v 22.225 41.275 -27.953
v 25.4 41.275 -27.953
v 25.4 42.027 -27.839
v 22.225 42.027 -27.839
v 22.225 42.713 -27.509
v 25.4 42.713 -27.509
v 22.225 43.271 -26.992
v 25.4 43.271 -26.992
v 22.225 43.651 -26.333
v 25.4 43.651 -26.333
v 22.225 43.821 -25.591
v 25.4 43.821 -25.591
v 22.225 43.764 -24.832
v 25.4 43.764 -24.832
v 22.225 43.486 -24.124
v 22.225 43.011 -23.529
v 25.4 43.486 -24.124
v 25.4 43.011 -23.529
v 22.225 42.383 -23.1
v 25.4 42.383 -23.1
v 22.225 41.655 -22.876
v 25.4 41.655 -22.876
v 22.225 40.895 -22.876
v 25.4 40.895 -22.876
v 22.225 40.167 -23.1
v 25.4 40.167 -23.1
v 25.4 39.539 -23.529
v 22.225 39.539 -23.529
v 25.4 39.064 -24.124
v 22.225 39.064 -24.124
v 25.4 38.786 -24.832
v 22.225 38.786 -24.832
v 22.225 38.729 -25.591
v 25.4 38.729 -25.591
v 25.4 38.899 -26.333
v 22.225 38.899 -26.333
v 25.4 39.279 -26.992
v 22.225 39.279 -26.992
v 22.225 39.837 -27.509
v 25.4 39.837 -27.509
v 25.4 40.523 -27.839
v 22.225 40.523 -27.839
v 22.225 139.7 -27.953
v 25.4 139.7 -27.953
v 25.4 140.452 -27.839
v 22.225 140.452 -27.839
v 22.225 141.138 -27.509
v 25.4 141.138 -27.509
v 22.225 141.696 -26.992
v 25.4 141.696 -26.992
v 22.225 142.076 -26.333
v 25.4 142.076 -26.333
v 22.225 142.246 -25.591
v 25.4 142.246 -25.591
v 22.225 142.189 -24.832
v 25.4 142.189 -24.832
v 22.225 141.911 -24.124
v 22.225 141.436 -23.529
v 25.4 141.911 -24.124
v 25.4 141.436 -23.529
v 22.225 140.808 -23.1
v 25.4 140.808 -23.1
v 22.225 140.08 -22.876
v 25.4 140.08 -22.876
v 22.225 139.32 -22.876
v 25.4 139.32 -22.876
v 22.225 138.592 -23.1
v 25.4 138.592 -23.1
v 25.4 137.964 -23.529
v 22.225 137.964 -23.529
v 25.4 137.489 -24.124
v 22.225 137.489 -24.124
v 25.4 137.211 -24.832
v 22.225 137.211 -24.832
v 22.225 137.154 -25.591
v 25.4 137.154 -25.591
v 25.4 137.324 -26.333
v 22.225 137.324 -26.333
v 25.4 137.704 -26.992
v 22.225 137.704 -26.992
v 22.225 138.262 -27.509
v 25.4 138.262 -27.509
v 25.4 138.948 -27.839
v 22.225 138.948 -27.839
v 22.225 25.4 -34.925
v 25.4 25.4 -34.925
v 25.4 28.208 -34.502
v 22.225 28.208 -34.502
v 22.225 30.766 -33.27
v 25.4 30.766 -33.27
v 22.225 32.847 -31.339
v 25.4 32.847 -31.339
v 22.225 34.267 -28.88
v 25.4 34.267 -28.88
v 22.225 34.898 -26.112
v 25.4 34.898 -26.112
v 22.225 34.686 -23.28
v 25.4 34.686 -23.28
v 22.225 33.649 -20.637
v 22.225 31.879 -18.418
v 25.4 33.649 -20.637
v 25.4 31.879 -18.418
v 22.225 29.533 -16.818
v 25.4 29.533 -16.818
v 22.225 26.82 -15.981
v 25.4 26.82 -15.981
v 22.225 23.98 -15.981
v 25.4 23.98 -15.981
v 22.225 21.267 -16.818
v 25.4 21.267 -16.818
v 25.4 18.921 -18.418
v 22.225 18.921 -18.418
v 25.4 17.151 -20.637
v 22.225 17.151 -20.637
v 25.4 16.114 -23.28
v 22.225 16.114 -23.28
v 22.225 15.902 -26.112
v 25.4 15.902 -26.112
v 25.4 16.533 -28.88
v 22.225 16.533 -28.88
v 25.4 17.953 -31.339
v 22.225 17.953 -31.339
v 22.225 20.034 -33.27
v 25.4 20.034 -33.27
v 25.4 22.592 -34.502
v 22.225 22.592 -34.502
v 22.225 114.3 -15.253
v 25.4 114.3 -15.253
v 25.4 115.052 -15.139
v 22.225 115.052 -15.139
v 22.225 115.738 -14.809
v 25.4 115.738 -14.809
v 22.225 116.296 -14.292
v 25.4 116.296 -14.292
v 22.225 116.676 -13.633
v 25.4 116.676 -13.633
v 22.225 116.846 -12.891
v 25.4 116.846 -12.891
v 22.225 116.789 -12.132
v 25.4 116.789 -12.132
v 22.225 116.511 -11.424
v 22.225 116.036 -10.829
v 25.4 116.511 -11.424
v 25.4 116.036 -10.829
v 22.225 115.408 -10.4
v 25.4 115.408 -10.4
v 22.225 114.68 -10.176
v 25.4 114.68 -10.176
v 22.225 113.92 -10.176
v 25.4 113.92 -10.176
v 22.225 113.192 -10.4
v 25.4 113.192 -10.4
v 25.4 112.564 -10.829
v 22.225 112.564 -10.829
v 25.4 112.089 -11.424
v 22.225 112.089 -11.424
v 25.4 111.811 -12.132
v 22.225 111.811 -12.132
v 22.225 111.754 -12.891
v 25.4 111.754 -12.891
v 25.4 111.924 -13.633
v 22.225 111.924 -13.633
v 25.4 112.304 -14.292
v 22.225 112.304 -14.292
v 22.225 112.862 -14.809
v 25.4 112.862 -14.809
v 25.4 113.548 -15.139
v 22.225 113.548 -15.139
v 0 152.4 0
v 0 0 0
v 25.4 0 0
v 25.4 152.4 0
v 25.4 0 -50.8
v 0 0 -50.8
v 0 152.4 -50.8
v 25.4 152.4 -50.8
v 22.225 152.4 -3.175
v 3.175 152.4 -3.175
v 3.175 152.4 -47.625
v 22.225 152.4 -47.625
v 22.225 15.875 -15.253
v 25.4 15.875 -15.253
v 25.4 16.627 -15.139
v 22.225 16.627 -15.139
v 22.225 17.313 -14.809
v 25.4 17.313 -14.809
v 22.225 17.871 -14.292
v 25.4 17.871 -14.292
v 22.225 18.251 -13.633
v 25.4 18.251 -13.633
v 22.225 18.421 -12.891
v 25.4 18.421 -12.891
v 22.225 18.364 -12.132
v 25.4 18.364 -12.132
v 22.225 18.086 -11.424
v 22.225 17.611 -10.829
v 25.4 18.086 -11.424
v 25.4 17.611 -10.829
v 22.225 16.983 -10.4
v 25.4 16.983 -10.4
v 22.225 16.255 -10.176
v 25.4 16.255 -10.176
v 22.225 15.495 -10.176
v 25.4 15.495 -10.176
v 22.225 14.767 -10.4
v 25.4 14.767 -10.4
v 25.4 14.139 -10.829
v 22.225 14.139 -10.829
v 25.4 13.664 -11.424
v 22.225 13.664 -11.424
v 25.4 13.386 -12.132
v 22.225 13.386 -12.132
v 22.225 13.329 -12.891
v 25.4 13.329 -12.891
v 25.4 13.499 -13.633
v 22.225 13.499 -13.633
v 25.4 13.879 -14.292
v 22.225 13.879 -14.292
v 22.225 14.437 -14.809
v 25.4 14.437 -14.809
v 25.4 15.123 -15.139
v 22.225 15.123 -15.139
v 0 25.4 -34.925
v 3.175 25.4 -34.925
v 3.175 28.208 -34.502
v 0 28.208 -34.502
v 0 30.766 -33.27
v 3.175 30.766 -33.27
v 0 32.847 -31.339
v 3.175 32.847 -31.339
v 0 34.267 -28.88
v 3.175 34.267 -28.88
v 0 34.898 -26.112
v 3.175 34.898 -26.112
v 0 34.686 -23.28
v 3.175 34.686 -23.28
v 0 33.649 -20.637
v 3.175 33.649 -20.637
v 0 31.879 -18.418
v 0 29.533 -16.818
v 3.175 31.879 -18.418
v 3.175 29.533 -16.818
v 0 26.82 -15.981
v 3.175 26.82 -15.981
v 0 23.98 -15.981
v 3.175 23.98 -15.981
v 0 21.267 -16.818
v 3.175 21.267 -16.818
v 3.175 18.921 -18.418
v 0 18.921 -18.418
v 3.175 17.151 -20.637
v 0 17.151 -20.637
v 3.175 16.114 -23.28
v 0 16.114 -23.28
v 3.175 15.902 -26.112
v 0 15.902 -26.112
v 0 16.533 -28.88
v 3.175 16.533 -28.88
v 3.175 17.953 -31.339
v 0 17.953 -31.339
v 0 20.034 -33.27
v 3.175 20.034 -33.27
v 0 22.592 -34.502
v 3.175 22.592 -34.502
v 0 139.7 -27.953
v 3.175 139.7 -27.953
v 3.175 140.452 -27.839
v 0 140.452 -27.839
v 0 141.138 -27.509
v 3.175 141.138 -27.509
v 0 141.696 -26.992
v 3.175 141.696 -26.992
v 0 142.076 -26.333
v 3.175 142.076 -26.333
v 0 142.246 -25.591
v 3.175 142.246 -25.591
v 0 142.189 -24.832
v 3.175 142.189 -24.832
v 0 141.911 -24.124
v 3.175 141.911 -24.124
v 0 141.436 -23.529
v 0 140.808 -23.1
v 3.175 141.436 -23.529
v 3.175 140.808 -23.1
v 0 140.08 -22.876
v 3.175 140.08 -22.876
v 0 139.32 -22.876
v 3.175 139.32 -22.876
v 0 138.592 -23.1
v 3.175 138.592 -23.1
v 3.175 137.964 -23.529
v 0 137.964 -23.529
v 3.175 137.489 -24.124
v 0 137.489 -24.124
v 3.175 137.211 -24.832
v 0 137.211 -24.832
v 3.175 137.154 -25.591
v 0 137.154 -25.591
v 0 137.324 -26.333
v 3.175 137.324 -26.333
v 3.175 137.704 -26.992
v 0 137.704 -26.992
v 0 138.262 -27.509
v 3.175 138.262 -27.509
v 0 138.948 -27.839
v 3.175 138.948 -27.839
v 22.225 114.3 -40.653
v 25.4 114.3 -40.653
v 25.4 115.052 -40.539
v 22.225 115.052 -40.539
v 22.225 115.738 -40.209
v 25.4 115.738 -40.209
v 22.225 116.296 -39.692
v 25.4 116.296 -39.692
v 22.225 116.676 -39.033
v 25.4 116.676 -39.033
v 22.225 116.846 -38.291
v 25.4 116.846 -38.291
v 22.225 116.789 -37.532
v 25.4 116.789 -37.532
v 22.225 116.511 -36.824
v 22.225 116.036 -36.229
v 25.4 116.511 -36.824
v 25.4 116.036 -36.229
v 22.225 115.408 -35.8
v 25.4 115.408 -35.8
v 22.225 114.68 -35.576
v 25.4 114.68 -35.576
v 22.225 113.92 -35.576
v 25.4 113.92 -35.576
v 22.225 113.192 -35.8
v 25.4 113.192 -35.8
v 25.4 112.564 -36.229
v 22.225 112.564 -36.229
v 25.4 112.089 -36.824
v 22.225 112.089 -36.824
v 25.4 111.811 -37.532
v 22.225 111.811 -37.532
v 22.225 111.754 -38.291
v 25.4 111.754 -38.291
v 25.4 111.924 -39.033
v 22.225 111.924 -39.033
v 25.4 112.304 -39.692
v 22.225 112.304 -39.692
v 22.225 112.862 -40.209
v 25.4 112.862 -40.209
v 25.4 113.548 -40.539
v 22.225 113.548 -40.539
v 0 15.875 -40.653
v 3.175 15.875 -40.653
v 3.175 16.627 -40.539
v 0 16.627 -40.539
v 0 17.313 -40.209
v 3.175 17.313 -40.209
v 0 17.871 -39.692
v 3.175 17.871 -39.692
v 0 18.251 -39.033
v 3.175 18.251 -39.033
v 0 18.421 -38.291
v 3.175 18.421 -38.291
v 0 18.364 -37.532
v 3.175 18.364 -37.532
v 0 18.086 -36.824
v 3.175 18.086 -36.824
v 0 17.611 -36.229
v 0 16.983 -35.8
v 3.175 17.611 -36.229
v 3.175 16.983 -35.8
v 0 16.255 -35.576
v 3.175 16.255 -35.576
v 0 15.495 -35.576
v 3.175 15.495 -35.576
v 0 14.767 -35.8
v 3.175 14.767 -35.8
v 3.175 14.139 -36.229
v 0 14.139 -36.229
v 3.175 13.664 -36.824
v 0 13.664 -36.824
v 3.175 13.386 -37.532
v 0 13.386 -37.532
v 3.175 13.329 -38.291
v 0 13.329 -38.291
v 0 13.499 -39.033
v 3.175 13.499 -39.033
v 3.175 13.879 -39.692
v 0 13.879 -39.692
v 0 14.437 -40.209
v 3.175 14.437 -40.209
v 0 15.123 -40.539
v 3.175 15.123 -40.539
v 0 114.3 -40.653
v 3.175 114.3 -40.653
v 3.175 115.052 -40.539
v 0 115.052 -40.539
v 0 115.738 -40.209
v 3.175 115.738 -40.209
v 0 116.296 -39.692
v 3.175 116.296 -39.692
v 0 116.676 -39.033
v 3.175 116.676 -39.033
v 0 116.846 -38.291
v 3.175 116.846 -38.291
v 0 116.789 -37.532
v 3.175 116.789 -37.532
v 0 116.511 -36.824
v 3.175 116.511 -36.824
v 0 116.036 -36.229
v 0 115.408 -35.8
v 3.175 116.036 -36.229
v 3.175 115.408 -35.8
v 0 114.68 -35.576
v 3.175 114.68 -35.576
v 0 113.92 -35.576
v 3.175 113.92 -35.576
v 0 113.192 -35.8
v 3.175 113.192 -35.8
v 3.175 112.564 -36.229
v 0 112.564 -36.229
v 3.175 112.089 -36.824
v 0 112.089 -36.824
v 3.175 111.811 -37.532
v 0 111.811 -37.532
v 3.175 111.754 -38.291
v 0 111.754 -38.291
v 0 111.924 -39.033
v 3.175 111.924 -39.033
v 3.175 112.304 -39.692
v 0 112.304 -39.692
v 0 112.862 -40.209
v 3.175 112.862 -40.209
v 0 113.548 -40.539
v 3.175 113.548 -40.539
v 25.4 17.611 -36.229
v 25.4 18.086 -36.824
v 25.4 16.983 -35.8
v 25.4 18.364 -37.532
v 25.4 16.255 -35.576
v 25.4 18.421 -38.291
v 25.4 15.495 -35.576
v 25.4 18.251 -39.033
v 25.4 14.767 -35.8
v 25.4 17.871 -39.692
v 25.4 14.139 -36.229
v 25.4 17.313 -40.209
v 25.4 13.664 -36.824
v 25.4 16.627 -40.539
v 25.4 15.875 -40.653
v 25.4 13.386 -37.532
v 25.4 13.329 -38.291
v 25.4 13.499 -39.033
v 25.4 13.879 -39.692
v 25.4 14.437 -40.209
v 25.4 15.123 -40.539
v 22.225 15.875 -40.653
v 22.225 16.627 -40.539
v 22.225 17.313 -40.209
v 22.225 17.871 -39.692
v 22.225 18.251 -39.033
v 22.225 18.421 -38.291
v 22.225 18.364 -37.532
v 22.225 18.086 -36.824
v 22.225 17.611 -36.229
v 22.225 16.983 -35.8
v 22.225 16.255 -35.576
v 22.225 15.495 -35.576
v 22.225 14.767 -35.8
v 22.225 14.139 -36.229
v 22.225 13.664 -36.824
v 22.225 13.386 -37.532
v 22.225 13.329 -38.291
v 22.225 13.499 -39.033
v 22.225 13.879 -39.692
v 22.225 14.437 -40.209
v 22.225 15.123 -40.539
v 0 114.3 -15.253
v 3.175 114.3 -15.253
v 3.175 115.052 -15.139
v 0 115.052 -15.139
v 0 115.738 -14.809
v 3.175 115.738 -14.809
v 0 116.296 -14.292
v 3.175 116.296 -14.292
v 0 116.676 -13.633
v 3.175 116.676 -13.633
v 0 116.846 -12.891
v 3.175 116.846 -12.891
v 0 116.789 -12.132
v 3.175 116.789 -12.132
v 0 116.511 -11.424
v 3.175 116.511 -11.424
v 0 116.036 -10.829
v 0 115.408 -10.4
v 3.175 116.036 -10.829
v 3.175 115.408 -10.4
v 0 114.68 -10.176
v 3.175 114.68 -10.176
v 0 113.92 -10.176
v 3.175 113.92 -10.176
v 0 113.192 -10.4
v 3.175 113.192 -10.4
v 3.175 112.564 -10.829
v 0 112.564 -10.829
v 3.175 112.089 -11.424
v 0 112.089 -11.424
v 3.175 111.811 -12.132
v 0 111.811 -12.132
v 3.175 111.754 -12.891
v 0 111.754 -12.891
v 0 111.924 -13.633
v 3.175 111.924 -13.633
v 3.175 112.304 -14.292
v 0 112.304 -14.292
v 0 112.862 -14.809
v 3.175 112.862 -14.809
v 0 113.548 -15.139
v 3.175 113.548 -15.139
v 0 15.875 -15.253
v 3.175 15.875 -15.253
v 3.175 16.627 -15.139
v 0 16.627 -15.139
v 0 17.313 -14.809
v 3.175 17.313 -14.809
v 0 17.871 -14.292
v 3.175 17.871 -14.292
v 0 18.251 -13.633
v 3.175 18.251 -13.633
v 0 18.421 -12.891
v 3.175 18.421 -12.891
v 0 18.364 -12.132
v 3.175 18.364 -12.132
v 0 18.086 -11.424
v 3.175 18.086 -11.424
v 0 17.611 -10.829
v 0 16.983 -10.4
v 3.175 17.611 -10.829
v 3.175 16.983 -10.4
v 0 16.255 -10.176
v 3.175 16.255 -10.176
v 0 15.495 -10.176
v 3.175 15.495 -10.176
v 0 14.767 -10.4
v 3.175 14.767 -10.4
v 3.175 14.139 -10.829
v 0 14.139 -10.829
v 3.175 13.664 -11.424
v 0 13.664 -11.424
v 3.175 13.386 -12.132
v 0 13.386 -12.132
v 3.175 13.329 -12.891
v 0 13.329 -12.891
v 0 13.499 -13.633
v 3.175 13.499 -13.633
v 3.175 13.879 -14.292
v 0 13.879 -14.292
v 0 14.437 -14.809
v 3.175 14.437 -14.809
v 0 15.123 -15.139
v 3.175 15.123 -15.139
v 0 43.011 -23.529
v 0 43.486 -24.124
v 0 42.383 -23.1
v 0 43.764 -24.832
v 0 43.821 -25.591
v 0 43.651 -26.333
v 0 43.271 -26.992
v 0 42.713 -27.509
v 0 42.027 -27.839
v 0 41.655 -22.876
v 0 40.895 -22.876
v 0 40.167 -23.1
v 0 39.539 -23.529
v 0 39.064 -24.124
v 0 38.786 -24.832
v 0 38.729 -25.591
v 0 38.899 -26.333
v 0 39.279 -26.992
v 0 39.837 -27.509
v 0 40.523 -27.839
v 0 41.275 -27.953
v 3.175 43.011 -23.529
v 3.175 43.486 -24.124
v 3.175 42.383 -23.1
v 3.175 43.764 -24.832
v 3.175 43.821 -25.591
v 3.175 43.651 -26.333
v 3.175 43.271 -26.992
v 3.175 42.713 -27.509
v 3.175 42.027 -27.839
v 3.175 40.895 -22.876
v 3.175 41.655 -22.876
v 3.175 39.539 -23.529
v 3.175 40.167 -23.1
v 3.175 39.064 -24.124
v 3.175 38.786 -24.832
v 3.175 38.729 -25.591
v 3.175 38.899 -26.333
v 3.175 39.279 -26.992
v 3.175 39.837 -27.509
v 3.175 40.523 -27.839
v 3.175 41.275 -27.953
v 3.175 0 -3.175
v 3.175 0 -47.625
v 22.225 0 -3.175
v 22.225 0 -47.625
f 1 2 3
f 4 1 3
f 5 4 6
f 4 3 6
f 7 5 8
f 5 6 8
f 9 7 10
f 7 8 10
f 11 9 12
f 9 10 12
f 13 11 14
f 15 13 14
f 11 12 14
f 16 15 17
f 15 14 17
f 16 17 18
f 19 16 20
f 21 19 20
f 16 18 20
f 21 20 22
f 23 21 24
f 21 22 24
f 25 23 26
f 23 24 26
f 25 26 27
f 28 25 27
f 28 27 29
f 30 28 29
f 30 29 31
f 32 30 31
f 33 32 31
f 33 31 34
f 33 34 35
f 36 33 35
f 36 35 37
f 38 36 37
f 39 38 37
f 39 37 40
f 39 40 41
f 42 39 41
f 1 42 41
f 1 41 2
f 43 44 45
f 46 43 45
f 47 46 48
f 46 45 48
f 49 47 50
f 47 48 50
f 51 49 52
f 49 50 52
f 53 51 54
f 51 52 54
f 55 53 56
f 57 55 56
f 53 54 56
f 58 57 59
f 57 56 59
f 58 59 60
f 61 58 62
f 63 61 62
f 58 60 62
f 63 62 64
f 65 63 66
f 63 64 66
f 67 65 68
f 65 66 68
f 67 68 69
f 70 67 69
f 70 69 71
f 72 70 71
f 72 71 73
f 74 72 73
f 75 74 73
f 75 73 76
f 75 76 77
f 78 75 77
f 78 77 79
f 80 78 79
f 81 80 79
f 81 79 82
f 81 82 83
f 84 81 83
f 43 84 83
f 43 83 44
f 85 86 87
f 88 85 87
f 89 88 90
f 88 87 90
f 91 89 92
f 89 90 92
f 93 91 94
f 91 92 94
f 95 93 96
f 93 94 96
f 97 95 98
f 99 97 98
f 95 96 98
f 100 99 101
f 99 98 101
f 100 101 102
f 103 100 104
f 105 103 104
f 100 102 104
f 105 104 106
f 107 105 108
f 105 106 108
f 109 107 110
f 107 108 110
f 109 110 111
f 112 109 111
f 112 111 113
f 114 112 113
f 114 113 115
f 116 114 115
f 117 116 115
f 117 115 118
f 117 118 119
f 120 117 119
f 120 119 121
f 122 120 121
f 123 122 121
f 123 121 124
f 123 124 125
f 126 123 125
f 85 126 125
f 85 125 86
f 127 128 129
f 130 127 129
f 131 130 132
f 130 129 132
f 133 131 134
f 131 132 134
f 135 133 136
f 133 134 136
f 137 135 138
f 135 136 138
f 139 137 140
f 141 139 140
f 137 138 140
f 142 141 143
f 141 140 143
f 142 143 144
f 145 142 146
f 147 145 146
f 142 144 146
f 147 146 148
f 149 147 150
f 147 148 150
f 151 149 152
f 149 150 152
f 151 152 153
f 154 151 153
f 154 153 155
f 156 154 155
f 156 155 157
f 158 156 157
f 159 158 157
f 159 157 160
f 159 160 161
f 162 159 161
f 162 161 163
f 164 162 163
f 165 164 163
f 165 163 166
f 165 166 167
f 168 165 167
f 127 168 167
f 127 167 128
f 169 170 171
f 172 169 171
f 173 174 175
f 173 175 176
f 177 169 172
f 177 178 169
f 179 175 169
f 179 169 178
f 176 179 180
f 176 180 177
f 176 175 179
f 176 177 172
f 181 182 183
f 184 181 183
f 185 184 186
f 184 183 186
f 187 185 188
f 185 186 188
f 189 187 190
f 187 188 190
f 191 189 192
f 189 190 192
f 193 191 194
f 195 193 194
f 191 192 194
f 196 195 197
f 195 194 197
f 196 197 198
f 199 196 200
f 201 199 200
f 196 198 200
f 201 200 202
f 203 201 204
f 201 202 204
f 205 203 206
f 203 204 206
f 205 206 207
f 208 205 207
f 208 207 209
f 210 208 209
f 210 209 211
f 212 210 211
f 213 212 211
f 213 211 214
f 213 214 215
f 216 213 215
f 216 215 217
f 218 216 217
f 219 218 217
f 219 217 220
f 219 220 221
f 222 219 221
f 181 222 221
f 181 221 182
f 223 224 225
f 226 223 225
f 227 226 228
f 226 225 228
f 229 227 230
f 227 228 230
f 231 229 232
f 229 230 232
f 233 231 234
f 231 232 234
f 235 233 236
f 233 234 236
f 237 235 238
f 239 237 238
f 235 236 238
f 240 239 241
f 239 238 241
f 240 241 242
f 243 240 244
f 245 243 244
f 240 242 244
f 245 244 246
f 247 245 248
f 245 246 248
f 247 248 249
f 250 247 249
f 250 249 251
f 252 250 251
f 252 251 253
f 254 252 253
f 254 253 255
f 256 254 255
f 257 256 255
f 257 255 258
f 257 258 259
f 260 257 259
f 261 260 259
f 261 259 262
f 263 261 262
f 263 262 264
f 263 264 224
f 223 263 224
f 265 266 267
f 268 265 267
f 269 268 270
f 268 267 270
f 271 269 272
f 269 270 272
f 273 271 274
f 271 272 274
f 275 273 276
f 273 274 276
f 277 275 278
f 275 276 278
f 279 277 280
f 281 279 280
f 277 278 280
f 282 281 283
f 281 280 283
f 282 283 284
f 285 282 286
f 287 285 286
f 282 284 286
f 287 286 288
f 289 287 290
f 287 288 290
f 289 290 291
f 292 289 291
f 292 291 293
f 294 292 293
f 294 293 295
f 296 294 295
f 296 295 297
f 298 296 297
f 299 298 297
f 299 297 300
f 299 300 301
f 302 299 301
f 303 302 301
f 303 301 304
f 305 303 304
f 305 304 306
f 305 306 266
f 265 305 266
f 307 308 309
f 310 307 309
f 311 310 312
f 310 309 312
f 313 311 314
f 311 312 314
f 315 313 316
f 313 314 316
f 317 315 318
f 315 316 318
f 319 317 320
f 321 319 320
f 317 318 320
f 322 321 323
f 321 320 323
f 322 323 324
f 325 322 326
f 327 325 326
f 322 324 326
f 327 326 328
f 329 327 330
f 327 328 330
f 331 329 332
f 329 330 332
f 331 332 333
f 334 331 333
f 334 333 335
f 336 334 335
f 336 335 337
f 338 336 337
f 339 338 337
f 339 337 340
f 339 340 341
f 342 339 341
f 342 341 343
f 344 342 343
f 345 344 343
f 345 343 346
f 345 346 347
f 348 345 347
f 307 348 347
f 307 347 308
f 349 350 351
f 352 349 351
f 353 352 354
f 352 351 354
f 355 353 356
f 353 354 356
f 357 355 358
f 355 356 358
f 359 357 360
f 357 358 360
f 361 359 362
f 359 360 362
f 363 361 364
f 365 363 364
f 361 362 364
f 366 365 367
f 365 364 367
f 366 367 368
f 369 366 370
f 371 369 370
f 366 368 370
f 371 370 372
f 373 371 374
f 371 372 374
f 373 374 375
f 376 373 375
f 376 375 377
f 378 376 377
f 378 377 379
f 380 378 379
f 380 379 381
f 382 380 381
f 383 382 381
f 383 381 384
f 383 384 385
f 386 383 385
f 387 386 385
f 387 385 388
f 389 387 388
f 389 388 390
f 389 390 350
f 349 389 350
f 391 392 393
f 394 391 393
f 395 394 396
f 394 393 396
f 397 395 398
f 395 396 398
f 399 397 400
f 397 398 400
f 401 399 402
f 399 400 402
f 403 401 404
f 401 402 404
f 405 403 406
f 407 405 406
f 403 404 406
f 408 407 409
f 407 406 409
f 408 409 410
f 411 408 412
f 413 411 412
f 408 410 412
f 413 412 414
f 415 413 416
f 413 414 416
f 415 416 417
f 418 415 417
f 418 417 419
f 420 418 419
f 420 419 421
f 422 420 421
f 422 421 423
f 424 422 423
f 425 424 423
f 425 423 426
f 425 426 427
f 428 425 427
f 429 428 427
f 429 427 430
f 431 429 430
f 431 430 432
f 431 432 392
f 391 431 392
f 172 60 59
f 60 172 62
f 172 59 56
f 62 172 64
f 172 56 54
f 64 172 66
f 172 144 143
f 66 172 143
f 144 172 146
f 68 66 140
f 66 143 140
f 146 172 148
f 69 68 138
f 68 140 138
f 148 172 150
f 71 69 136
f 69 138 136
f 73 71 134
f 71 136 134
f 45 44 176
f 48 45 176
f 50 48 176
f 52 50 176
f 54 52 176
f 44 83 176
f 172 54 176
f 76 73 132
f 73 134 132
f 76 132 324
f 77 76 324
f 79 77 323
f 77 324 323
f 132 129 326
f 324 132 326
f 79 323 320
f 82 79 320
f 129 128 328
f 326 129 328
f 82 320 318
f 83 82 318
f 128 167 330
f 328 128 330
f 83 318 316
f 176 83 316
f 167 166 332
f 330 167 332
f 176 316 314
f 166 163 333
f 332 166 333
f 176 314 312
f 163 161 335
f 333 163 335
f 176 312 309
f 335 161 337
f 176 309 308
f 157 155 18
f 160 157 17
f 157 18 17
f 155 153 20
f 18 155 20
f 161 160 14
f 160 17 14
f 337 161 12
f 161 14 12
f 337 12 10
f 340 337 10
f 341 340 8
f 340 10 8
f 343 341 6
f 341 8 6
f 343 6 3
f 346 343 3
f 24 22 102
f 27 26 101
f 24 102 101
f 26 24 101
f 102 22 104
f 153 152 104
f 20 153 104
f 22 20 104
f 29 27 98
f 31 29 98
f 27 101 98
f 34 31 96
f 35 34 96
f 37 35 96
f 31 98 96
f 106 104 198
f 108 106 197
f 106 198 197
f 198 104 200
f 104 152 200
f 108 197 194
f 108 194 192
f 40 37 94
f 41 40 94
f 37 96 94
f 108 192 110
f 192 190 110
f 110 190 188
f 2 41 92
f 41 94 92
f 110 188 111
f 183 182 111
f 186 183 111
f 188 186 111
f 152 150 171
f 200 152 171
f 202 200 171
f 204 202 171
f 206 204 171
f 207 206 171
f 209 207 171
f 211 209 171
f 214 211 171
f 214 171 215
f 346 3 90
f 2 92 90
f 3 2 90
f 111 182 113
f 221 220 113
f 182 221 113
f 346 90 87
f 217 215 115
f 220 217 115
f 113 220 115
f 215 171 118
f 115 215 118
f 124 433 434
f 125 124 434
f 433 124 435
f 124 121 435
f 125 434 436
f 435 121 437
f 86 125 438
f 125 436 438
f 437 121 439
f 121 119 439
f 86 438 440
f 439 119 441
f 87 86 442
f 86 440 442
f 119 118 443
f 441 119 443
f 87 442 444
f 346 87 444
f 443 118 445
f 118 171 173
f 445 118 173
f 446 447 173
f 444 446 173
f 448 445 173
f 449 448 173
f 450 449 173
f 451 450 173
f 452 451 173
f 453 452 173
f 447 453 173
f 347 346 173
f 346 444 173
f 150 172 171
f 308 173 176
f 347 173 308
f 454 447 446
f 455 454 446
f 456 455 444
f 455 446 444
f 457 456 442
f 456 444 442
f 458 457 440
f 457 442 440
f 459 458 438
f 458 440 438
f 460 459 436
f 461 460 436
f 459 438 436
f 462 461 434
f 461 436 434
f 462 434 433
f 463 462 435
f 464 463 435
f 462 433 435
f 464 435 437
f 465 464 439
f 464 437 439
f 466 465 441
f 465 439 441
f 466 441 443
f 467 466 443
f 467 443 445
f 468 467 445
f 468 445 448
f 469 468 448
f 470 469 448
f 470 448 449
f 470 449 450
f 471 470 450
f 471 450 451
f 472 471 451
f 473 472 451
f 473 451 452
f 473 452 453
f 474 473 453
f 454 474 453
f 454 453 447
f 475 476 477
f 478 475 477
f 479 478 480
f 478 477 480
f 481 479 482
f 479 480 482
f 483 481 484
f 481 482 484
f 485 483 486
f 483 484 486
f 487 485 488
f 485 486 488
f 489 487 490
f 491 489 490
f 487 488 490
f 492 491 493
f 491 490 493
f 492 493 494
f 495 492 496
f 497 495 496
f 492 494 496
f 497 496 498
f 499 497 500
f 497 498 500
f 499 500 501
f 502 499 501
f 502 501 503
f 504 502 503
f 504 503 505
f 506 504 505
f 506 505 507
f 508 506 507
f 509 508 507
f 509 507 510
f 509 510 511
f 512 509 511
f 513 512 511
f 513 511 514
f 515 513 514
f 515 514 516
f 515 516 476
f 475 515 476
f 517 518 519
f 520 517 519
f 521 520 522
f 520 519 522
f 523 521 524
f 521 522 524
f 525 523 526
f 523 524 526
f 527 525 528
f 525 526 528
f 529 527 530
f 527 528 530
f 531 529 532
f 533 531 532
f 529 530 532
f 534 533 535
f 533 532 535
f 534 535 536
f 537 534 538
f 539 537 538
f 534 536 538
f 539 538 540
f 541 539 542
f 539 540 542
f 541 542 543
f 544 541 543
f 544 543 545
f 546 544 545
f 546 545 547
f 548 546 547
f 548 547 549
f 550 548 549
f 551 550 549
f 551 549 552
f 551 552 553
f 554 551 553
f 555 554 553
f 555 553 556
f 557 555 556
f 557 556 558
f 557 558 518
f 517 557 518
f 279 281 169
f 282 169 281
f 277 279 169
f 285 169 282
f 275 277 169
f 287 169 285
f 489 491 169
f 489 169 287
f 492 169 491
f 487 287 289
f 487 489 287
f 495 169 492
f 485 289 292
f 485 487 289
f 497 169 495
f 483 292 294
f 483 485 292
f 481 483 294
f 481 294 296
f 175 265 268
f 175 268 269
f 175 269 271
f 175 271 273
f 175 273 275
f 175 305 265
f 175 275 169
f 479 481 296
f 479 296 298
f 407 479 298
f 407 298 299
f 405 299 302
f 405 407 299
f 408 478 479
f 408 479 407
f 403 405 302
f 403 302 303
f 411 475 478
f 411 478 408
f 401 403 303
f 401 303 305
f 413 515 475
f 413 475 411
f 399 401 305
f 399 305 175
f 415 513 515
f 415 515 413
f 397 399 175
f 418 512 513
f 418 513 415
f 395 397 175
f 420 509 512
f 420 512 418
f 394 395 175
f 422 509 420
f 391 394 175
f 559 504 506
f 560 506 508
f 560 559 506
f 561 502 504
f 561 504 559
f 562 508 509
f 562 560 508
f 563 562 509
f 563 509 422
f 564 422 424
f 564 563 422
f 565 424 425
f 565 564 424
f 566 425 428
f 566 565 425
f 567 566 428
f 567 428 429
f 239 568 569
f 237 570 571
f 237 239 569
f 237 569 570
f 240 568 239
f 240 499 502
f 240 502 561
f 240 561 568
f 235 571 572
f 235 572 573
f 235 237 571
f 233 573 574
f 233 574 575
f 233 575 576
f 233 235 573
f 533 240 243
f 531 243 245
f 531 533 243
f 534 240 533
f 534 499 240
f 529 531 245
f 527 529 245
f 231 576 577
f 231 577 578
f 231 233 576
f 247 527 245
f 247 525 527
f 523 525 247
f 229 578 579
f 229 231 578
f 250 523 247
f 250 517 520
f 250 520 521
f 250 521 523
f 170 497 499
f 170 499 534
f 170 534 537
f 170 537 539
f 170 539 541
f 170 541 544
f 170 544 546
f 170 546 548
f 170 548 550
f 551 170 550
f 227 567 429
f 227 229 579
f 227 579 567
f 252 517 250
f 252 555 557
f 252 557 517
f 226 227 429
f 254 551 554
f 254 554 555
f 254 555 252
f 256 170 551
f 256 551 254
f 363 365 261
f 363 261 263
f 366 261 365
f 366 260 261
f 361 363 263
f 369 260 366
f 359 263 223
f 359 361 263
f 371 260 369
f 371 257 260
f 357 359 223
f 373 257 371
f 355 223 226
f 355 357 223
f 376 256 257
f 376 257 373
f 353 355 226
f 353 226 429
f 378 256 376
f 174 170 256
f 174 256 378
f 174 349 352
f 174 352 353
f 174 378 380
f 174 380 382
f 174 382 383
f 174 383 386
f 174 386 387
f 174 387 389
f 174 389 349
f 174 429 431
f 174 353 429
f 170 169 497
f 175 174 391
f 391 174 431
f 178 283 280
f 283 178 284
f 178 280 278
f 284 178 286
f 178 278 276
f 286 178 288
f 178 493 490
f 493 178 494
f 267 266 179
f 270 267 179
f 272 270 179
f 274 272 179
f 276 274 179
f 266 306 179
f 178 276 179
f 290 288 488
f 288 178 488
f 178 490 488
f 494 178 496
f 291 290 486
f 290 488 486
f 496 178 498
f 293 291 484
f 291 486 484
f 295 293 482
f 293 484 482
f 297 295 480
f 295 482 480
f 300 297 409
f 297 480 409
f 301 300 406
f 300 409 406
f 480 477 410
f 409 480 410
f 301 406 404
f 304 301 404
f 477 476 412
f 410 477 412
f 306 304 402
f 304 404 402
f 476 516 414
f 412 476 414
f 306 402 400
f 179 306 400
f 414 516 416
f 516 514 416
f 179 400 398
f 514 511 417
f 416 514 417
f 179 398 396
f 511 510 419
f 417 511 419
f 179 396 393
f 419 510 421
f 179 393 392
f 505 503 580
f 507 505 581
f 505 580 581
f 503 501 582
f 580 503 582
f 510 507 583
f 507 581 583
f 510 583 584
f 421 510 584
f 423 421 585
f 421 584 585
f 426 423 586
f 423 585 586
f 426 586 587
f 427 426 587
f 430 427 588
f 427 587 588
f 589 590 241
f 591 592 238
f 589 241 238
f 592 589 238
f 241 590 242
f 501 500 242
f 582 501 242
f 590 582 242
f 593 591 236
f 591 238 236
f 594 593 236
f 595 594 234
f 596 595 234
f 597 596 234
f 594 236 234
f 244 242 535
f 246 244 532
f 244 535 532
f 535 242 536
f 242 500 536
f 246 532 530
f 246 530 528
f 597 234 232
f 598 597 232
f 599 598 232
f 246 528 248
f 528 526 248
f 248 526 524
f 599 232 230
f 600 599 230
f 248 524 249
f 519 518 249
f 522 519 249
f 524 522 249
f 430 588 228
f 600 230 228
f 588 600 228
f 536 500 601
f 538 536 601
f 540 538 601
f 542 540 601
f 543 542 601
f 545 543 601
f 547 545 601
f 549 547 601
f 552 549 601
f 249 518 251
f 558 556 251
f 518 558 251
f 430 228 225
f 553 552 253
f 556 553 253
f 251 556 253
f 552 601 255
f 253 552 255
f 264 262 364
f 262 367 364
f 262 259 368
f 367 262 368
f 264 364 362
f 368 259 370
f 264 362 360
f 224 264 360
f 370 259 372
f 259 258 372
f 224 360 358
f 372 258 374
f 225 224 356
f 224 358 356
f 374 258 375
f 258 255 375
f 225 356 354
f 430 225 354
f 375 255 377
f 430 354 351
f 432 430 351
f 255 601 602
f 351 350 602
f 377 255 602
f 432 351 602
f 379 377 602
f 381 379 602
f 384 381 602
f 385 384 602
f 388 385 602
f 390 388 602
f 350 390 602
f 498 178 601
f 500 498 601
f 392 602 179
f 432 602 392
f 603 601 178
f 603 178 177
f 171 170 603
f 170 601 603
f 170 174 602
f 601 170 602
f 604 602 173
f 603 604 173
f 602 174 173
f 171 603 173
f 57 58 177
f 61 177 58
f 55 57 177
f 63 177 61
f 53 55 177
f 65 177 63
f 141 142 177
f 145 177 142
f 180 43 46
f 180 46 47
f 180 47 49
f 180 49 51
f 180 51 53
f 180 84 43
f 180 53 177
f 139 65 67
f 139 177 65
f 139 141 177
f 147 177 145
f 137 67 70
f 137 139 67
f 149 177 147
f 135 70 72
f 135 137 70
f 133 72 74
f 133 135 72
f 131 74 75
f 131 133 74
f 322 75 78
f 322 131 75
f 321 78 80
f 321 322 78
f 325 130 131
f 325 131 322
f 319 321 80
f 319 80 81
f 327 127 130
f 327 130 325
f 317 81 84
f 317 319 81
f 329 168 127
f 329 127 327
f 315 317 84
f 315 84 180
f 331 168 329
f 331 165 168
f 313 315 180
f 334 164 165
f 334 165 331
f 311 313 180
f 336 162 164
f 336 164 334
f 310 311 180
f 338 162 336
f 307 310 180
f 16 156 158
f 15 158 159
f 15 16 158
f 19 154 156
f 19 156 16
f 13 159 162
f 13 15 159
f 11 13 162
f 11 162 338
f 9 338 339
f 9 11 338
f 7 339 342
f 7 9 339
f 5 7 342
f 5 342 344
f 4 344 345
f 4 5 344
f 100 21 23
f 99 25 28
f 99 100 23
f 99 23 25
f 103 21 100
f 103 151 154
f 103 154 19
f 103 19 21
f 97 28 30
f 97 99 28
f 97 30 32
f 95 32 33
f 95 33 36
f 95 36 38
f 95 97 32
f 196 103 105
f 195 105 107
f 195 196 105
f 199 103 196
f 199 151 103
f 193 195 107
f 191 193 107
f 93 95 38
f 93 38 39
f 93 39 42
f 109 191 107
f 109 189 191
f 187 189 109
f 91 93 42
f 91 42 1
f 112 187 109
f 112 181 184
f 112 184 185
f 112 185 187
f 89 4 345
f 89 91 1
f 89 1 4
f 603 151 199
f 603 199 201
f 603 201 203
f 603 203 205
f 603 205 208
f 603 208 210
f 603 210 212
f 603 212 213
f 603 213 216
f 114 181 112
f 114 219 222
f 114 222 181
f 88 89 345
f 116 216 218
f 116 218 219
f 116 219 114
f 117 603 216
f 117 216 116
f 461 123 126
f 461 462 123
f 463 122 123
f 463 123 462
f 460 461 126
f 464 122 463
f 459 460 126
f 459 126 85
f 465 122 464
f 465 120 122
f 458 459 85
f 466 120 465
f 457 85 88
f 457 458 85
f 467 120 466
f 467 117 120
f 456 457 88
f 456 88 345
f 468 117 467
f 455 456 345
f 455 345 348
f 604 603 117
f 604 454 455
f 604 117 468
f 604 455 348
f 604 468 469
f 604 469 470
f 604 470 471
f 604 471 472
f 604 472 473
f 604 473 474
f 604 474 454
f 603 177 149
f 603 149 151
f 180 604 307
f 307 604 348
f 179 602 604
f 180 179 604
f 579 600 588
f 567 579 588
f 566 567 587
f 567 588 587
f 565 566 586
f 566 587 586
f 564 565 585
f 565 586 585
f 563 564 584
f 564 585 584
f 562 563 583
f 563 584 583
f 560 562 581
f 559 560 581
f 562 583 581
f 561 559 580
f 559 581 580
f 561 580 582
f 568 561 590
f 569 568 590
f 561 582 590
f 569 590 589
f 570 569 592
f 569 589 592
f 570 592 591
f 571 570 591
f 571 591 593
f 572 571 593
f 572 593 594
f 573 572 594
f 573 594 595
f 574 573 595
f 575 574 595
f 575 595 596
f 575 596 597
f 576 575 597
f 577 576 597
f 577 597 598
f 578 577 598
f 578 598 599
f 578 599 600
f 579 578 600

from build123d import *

# Parameters (mm, degrees)
SKETCH1_W           = 25.4
SKETCH1_H           = 50.8
SKETCH1_W_2         = 19.05
SKETCH1_H_2         = 44.45
BOSS_EXTRUDE1_DEPTH = 152.4
SKETCH2_R           = 2.5527
CUT_EXTRUDE1_DEPTH  = 50.8
SKETCH3_R           = 9.525
CUT_EXTRUDE2_DEPTH  = 25.4


with BuildPart() as part:
    # Sketch1 → Boss-Extrude1 (new body)
    with BuildSketch(Plane(origin=(0, 0, 0), x_dir=(1, 0, 0), z_dir=(0, 1, 0))):
        with Locations((12.7, 25.4)):
            Rectangle(SKETCH1_W, SKETCH1_H)
        with Locations((12.7, 25.4)):
            Rectangle(SKETCH1_W_2, SKETCH1_H_2, mode=Mode.SUBTRACT)
    extrude(amount=BOSS_EXTRUDE1_DEPTH)

    # Sketch2 → Cut-Extrude1 (cut)
    with BuildSketch(Plane(origin=(25.4, 0, 0), x_dir=(0, 0, -1), z_dir=(1, 0, 0))):
        with Locations((25.4, 139.7)):
            Circle(SKETCH2_R)
        with Locations((12.7, 114.3)):
            Circle(SKETCH2_R)
        with Locations((38.1, 114.3)):
            Circle(SKETCH2_R)
        with Locations((25.4, 41.275)):
            Circle(SKETCH2_R)
        with Locations((12.7, 15.875)):
            Circle(SKETCH2_R)
        with Locations((38.1, 15.875)):
            Circle(SKETCH2_R)
    extrude(amount=-CUT_EXTRUDE1_DEPTH, mode=Mode.SUBTRACT)

    # Sketch3 → Cut-Extrude2 (cut)
    with BuildSketch(Plane(origin=(25.4, 0, 0), x_dir=(0, 0, -1), z_dir=(1, 0, 0))):
        with Locations((25.4, 25.4)):
            Circle(SKETCH3_R)
    extrude(amount=-CUT_EXTRUDE2_DEPTH, mode=Mode.SUBTRACT)


solid = part.part
